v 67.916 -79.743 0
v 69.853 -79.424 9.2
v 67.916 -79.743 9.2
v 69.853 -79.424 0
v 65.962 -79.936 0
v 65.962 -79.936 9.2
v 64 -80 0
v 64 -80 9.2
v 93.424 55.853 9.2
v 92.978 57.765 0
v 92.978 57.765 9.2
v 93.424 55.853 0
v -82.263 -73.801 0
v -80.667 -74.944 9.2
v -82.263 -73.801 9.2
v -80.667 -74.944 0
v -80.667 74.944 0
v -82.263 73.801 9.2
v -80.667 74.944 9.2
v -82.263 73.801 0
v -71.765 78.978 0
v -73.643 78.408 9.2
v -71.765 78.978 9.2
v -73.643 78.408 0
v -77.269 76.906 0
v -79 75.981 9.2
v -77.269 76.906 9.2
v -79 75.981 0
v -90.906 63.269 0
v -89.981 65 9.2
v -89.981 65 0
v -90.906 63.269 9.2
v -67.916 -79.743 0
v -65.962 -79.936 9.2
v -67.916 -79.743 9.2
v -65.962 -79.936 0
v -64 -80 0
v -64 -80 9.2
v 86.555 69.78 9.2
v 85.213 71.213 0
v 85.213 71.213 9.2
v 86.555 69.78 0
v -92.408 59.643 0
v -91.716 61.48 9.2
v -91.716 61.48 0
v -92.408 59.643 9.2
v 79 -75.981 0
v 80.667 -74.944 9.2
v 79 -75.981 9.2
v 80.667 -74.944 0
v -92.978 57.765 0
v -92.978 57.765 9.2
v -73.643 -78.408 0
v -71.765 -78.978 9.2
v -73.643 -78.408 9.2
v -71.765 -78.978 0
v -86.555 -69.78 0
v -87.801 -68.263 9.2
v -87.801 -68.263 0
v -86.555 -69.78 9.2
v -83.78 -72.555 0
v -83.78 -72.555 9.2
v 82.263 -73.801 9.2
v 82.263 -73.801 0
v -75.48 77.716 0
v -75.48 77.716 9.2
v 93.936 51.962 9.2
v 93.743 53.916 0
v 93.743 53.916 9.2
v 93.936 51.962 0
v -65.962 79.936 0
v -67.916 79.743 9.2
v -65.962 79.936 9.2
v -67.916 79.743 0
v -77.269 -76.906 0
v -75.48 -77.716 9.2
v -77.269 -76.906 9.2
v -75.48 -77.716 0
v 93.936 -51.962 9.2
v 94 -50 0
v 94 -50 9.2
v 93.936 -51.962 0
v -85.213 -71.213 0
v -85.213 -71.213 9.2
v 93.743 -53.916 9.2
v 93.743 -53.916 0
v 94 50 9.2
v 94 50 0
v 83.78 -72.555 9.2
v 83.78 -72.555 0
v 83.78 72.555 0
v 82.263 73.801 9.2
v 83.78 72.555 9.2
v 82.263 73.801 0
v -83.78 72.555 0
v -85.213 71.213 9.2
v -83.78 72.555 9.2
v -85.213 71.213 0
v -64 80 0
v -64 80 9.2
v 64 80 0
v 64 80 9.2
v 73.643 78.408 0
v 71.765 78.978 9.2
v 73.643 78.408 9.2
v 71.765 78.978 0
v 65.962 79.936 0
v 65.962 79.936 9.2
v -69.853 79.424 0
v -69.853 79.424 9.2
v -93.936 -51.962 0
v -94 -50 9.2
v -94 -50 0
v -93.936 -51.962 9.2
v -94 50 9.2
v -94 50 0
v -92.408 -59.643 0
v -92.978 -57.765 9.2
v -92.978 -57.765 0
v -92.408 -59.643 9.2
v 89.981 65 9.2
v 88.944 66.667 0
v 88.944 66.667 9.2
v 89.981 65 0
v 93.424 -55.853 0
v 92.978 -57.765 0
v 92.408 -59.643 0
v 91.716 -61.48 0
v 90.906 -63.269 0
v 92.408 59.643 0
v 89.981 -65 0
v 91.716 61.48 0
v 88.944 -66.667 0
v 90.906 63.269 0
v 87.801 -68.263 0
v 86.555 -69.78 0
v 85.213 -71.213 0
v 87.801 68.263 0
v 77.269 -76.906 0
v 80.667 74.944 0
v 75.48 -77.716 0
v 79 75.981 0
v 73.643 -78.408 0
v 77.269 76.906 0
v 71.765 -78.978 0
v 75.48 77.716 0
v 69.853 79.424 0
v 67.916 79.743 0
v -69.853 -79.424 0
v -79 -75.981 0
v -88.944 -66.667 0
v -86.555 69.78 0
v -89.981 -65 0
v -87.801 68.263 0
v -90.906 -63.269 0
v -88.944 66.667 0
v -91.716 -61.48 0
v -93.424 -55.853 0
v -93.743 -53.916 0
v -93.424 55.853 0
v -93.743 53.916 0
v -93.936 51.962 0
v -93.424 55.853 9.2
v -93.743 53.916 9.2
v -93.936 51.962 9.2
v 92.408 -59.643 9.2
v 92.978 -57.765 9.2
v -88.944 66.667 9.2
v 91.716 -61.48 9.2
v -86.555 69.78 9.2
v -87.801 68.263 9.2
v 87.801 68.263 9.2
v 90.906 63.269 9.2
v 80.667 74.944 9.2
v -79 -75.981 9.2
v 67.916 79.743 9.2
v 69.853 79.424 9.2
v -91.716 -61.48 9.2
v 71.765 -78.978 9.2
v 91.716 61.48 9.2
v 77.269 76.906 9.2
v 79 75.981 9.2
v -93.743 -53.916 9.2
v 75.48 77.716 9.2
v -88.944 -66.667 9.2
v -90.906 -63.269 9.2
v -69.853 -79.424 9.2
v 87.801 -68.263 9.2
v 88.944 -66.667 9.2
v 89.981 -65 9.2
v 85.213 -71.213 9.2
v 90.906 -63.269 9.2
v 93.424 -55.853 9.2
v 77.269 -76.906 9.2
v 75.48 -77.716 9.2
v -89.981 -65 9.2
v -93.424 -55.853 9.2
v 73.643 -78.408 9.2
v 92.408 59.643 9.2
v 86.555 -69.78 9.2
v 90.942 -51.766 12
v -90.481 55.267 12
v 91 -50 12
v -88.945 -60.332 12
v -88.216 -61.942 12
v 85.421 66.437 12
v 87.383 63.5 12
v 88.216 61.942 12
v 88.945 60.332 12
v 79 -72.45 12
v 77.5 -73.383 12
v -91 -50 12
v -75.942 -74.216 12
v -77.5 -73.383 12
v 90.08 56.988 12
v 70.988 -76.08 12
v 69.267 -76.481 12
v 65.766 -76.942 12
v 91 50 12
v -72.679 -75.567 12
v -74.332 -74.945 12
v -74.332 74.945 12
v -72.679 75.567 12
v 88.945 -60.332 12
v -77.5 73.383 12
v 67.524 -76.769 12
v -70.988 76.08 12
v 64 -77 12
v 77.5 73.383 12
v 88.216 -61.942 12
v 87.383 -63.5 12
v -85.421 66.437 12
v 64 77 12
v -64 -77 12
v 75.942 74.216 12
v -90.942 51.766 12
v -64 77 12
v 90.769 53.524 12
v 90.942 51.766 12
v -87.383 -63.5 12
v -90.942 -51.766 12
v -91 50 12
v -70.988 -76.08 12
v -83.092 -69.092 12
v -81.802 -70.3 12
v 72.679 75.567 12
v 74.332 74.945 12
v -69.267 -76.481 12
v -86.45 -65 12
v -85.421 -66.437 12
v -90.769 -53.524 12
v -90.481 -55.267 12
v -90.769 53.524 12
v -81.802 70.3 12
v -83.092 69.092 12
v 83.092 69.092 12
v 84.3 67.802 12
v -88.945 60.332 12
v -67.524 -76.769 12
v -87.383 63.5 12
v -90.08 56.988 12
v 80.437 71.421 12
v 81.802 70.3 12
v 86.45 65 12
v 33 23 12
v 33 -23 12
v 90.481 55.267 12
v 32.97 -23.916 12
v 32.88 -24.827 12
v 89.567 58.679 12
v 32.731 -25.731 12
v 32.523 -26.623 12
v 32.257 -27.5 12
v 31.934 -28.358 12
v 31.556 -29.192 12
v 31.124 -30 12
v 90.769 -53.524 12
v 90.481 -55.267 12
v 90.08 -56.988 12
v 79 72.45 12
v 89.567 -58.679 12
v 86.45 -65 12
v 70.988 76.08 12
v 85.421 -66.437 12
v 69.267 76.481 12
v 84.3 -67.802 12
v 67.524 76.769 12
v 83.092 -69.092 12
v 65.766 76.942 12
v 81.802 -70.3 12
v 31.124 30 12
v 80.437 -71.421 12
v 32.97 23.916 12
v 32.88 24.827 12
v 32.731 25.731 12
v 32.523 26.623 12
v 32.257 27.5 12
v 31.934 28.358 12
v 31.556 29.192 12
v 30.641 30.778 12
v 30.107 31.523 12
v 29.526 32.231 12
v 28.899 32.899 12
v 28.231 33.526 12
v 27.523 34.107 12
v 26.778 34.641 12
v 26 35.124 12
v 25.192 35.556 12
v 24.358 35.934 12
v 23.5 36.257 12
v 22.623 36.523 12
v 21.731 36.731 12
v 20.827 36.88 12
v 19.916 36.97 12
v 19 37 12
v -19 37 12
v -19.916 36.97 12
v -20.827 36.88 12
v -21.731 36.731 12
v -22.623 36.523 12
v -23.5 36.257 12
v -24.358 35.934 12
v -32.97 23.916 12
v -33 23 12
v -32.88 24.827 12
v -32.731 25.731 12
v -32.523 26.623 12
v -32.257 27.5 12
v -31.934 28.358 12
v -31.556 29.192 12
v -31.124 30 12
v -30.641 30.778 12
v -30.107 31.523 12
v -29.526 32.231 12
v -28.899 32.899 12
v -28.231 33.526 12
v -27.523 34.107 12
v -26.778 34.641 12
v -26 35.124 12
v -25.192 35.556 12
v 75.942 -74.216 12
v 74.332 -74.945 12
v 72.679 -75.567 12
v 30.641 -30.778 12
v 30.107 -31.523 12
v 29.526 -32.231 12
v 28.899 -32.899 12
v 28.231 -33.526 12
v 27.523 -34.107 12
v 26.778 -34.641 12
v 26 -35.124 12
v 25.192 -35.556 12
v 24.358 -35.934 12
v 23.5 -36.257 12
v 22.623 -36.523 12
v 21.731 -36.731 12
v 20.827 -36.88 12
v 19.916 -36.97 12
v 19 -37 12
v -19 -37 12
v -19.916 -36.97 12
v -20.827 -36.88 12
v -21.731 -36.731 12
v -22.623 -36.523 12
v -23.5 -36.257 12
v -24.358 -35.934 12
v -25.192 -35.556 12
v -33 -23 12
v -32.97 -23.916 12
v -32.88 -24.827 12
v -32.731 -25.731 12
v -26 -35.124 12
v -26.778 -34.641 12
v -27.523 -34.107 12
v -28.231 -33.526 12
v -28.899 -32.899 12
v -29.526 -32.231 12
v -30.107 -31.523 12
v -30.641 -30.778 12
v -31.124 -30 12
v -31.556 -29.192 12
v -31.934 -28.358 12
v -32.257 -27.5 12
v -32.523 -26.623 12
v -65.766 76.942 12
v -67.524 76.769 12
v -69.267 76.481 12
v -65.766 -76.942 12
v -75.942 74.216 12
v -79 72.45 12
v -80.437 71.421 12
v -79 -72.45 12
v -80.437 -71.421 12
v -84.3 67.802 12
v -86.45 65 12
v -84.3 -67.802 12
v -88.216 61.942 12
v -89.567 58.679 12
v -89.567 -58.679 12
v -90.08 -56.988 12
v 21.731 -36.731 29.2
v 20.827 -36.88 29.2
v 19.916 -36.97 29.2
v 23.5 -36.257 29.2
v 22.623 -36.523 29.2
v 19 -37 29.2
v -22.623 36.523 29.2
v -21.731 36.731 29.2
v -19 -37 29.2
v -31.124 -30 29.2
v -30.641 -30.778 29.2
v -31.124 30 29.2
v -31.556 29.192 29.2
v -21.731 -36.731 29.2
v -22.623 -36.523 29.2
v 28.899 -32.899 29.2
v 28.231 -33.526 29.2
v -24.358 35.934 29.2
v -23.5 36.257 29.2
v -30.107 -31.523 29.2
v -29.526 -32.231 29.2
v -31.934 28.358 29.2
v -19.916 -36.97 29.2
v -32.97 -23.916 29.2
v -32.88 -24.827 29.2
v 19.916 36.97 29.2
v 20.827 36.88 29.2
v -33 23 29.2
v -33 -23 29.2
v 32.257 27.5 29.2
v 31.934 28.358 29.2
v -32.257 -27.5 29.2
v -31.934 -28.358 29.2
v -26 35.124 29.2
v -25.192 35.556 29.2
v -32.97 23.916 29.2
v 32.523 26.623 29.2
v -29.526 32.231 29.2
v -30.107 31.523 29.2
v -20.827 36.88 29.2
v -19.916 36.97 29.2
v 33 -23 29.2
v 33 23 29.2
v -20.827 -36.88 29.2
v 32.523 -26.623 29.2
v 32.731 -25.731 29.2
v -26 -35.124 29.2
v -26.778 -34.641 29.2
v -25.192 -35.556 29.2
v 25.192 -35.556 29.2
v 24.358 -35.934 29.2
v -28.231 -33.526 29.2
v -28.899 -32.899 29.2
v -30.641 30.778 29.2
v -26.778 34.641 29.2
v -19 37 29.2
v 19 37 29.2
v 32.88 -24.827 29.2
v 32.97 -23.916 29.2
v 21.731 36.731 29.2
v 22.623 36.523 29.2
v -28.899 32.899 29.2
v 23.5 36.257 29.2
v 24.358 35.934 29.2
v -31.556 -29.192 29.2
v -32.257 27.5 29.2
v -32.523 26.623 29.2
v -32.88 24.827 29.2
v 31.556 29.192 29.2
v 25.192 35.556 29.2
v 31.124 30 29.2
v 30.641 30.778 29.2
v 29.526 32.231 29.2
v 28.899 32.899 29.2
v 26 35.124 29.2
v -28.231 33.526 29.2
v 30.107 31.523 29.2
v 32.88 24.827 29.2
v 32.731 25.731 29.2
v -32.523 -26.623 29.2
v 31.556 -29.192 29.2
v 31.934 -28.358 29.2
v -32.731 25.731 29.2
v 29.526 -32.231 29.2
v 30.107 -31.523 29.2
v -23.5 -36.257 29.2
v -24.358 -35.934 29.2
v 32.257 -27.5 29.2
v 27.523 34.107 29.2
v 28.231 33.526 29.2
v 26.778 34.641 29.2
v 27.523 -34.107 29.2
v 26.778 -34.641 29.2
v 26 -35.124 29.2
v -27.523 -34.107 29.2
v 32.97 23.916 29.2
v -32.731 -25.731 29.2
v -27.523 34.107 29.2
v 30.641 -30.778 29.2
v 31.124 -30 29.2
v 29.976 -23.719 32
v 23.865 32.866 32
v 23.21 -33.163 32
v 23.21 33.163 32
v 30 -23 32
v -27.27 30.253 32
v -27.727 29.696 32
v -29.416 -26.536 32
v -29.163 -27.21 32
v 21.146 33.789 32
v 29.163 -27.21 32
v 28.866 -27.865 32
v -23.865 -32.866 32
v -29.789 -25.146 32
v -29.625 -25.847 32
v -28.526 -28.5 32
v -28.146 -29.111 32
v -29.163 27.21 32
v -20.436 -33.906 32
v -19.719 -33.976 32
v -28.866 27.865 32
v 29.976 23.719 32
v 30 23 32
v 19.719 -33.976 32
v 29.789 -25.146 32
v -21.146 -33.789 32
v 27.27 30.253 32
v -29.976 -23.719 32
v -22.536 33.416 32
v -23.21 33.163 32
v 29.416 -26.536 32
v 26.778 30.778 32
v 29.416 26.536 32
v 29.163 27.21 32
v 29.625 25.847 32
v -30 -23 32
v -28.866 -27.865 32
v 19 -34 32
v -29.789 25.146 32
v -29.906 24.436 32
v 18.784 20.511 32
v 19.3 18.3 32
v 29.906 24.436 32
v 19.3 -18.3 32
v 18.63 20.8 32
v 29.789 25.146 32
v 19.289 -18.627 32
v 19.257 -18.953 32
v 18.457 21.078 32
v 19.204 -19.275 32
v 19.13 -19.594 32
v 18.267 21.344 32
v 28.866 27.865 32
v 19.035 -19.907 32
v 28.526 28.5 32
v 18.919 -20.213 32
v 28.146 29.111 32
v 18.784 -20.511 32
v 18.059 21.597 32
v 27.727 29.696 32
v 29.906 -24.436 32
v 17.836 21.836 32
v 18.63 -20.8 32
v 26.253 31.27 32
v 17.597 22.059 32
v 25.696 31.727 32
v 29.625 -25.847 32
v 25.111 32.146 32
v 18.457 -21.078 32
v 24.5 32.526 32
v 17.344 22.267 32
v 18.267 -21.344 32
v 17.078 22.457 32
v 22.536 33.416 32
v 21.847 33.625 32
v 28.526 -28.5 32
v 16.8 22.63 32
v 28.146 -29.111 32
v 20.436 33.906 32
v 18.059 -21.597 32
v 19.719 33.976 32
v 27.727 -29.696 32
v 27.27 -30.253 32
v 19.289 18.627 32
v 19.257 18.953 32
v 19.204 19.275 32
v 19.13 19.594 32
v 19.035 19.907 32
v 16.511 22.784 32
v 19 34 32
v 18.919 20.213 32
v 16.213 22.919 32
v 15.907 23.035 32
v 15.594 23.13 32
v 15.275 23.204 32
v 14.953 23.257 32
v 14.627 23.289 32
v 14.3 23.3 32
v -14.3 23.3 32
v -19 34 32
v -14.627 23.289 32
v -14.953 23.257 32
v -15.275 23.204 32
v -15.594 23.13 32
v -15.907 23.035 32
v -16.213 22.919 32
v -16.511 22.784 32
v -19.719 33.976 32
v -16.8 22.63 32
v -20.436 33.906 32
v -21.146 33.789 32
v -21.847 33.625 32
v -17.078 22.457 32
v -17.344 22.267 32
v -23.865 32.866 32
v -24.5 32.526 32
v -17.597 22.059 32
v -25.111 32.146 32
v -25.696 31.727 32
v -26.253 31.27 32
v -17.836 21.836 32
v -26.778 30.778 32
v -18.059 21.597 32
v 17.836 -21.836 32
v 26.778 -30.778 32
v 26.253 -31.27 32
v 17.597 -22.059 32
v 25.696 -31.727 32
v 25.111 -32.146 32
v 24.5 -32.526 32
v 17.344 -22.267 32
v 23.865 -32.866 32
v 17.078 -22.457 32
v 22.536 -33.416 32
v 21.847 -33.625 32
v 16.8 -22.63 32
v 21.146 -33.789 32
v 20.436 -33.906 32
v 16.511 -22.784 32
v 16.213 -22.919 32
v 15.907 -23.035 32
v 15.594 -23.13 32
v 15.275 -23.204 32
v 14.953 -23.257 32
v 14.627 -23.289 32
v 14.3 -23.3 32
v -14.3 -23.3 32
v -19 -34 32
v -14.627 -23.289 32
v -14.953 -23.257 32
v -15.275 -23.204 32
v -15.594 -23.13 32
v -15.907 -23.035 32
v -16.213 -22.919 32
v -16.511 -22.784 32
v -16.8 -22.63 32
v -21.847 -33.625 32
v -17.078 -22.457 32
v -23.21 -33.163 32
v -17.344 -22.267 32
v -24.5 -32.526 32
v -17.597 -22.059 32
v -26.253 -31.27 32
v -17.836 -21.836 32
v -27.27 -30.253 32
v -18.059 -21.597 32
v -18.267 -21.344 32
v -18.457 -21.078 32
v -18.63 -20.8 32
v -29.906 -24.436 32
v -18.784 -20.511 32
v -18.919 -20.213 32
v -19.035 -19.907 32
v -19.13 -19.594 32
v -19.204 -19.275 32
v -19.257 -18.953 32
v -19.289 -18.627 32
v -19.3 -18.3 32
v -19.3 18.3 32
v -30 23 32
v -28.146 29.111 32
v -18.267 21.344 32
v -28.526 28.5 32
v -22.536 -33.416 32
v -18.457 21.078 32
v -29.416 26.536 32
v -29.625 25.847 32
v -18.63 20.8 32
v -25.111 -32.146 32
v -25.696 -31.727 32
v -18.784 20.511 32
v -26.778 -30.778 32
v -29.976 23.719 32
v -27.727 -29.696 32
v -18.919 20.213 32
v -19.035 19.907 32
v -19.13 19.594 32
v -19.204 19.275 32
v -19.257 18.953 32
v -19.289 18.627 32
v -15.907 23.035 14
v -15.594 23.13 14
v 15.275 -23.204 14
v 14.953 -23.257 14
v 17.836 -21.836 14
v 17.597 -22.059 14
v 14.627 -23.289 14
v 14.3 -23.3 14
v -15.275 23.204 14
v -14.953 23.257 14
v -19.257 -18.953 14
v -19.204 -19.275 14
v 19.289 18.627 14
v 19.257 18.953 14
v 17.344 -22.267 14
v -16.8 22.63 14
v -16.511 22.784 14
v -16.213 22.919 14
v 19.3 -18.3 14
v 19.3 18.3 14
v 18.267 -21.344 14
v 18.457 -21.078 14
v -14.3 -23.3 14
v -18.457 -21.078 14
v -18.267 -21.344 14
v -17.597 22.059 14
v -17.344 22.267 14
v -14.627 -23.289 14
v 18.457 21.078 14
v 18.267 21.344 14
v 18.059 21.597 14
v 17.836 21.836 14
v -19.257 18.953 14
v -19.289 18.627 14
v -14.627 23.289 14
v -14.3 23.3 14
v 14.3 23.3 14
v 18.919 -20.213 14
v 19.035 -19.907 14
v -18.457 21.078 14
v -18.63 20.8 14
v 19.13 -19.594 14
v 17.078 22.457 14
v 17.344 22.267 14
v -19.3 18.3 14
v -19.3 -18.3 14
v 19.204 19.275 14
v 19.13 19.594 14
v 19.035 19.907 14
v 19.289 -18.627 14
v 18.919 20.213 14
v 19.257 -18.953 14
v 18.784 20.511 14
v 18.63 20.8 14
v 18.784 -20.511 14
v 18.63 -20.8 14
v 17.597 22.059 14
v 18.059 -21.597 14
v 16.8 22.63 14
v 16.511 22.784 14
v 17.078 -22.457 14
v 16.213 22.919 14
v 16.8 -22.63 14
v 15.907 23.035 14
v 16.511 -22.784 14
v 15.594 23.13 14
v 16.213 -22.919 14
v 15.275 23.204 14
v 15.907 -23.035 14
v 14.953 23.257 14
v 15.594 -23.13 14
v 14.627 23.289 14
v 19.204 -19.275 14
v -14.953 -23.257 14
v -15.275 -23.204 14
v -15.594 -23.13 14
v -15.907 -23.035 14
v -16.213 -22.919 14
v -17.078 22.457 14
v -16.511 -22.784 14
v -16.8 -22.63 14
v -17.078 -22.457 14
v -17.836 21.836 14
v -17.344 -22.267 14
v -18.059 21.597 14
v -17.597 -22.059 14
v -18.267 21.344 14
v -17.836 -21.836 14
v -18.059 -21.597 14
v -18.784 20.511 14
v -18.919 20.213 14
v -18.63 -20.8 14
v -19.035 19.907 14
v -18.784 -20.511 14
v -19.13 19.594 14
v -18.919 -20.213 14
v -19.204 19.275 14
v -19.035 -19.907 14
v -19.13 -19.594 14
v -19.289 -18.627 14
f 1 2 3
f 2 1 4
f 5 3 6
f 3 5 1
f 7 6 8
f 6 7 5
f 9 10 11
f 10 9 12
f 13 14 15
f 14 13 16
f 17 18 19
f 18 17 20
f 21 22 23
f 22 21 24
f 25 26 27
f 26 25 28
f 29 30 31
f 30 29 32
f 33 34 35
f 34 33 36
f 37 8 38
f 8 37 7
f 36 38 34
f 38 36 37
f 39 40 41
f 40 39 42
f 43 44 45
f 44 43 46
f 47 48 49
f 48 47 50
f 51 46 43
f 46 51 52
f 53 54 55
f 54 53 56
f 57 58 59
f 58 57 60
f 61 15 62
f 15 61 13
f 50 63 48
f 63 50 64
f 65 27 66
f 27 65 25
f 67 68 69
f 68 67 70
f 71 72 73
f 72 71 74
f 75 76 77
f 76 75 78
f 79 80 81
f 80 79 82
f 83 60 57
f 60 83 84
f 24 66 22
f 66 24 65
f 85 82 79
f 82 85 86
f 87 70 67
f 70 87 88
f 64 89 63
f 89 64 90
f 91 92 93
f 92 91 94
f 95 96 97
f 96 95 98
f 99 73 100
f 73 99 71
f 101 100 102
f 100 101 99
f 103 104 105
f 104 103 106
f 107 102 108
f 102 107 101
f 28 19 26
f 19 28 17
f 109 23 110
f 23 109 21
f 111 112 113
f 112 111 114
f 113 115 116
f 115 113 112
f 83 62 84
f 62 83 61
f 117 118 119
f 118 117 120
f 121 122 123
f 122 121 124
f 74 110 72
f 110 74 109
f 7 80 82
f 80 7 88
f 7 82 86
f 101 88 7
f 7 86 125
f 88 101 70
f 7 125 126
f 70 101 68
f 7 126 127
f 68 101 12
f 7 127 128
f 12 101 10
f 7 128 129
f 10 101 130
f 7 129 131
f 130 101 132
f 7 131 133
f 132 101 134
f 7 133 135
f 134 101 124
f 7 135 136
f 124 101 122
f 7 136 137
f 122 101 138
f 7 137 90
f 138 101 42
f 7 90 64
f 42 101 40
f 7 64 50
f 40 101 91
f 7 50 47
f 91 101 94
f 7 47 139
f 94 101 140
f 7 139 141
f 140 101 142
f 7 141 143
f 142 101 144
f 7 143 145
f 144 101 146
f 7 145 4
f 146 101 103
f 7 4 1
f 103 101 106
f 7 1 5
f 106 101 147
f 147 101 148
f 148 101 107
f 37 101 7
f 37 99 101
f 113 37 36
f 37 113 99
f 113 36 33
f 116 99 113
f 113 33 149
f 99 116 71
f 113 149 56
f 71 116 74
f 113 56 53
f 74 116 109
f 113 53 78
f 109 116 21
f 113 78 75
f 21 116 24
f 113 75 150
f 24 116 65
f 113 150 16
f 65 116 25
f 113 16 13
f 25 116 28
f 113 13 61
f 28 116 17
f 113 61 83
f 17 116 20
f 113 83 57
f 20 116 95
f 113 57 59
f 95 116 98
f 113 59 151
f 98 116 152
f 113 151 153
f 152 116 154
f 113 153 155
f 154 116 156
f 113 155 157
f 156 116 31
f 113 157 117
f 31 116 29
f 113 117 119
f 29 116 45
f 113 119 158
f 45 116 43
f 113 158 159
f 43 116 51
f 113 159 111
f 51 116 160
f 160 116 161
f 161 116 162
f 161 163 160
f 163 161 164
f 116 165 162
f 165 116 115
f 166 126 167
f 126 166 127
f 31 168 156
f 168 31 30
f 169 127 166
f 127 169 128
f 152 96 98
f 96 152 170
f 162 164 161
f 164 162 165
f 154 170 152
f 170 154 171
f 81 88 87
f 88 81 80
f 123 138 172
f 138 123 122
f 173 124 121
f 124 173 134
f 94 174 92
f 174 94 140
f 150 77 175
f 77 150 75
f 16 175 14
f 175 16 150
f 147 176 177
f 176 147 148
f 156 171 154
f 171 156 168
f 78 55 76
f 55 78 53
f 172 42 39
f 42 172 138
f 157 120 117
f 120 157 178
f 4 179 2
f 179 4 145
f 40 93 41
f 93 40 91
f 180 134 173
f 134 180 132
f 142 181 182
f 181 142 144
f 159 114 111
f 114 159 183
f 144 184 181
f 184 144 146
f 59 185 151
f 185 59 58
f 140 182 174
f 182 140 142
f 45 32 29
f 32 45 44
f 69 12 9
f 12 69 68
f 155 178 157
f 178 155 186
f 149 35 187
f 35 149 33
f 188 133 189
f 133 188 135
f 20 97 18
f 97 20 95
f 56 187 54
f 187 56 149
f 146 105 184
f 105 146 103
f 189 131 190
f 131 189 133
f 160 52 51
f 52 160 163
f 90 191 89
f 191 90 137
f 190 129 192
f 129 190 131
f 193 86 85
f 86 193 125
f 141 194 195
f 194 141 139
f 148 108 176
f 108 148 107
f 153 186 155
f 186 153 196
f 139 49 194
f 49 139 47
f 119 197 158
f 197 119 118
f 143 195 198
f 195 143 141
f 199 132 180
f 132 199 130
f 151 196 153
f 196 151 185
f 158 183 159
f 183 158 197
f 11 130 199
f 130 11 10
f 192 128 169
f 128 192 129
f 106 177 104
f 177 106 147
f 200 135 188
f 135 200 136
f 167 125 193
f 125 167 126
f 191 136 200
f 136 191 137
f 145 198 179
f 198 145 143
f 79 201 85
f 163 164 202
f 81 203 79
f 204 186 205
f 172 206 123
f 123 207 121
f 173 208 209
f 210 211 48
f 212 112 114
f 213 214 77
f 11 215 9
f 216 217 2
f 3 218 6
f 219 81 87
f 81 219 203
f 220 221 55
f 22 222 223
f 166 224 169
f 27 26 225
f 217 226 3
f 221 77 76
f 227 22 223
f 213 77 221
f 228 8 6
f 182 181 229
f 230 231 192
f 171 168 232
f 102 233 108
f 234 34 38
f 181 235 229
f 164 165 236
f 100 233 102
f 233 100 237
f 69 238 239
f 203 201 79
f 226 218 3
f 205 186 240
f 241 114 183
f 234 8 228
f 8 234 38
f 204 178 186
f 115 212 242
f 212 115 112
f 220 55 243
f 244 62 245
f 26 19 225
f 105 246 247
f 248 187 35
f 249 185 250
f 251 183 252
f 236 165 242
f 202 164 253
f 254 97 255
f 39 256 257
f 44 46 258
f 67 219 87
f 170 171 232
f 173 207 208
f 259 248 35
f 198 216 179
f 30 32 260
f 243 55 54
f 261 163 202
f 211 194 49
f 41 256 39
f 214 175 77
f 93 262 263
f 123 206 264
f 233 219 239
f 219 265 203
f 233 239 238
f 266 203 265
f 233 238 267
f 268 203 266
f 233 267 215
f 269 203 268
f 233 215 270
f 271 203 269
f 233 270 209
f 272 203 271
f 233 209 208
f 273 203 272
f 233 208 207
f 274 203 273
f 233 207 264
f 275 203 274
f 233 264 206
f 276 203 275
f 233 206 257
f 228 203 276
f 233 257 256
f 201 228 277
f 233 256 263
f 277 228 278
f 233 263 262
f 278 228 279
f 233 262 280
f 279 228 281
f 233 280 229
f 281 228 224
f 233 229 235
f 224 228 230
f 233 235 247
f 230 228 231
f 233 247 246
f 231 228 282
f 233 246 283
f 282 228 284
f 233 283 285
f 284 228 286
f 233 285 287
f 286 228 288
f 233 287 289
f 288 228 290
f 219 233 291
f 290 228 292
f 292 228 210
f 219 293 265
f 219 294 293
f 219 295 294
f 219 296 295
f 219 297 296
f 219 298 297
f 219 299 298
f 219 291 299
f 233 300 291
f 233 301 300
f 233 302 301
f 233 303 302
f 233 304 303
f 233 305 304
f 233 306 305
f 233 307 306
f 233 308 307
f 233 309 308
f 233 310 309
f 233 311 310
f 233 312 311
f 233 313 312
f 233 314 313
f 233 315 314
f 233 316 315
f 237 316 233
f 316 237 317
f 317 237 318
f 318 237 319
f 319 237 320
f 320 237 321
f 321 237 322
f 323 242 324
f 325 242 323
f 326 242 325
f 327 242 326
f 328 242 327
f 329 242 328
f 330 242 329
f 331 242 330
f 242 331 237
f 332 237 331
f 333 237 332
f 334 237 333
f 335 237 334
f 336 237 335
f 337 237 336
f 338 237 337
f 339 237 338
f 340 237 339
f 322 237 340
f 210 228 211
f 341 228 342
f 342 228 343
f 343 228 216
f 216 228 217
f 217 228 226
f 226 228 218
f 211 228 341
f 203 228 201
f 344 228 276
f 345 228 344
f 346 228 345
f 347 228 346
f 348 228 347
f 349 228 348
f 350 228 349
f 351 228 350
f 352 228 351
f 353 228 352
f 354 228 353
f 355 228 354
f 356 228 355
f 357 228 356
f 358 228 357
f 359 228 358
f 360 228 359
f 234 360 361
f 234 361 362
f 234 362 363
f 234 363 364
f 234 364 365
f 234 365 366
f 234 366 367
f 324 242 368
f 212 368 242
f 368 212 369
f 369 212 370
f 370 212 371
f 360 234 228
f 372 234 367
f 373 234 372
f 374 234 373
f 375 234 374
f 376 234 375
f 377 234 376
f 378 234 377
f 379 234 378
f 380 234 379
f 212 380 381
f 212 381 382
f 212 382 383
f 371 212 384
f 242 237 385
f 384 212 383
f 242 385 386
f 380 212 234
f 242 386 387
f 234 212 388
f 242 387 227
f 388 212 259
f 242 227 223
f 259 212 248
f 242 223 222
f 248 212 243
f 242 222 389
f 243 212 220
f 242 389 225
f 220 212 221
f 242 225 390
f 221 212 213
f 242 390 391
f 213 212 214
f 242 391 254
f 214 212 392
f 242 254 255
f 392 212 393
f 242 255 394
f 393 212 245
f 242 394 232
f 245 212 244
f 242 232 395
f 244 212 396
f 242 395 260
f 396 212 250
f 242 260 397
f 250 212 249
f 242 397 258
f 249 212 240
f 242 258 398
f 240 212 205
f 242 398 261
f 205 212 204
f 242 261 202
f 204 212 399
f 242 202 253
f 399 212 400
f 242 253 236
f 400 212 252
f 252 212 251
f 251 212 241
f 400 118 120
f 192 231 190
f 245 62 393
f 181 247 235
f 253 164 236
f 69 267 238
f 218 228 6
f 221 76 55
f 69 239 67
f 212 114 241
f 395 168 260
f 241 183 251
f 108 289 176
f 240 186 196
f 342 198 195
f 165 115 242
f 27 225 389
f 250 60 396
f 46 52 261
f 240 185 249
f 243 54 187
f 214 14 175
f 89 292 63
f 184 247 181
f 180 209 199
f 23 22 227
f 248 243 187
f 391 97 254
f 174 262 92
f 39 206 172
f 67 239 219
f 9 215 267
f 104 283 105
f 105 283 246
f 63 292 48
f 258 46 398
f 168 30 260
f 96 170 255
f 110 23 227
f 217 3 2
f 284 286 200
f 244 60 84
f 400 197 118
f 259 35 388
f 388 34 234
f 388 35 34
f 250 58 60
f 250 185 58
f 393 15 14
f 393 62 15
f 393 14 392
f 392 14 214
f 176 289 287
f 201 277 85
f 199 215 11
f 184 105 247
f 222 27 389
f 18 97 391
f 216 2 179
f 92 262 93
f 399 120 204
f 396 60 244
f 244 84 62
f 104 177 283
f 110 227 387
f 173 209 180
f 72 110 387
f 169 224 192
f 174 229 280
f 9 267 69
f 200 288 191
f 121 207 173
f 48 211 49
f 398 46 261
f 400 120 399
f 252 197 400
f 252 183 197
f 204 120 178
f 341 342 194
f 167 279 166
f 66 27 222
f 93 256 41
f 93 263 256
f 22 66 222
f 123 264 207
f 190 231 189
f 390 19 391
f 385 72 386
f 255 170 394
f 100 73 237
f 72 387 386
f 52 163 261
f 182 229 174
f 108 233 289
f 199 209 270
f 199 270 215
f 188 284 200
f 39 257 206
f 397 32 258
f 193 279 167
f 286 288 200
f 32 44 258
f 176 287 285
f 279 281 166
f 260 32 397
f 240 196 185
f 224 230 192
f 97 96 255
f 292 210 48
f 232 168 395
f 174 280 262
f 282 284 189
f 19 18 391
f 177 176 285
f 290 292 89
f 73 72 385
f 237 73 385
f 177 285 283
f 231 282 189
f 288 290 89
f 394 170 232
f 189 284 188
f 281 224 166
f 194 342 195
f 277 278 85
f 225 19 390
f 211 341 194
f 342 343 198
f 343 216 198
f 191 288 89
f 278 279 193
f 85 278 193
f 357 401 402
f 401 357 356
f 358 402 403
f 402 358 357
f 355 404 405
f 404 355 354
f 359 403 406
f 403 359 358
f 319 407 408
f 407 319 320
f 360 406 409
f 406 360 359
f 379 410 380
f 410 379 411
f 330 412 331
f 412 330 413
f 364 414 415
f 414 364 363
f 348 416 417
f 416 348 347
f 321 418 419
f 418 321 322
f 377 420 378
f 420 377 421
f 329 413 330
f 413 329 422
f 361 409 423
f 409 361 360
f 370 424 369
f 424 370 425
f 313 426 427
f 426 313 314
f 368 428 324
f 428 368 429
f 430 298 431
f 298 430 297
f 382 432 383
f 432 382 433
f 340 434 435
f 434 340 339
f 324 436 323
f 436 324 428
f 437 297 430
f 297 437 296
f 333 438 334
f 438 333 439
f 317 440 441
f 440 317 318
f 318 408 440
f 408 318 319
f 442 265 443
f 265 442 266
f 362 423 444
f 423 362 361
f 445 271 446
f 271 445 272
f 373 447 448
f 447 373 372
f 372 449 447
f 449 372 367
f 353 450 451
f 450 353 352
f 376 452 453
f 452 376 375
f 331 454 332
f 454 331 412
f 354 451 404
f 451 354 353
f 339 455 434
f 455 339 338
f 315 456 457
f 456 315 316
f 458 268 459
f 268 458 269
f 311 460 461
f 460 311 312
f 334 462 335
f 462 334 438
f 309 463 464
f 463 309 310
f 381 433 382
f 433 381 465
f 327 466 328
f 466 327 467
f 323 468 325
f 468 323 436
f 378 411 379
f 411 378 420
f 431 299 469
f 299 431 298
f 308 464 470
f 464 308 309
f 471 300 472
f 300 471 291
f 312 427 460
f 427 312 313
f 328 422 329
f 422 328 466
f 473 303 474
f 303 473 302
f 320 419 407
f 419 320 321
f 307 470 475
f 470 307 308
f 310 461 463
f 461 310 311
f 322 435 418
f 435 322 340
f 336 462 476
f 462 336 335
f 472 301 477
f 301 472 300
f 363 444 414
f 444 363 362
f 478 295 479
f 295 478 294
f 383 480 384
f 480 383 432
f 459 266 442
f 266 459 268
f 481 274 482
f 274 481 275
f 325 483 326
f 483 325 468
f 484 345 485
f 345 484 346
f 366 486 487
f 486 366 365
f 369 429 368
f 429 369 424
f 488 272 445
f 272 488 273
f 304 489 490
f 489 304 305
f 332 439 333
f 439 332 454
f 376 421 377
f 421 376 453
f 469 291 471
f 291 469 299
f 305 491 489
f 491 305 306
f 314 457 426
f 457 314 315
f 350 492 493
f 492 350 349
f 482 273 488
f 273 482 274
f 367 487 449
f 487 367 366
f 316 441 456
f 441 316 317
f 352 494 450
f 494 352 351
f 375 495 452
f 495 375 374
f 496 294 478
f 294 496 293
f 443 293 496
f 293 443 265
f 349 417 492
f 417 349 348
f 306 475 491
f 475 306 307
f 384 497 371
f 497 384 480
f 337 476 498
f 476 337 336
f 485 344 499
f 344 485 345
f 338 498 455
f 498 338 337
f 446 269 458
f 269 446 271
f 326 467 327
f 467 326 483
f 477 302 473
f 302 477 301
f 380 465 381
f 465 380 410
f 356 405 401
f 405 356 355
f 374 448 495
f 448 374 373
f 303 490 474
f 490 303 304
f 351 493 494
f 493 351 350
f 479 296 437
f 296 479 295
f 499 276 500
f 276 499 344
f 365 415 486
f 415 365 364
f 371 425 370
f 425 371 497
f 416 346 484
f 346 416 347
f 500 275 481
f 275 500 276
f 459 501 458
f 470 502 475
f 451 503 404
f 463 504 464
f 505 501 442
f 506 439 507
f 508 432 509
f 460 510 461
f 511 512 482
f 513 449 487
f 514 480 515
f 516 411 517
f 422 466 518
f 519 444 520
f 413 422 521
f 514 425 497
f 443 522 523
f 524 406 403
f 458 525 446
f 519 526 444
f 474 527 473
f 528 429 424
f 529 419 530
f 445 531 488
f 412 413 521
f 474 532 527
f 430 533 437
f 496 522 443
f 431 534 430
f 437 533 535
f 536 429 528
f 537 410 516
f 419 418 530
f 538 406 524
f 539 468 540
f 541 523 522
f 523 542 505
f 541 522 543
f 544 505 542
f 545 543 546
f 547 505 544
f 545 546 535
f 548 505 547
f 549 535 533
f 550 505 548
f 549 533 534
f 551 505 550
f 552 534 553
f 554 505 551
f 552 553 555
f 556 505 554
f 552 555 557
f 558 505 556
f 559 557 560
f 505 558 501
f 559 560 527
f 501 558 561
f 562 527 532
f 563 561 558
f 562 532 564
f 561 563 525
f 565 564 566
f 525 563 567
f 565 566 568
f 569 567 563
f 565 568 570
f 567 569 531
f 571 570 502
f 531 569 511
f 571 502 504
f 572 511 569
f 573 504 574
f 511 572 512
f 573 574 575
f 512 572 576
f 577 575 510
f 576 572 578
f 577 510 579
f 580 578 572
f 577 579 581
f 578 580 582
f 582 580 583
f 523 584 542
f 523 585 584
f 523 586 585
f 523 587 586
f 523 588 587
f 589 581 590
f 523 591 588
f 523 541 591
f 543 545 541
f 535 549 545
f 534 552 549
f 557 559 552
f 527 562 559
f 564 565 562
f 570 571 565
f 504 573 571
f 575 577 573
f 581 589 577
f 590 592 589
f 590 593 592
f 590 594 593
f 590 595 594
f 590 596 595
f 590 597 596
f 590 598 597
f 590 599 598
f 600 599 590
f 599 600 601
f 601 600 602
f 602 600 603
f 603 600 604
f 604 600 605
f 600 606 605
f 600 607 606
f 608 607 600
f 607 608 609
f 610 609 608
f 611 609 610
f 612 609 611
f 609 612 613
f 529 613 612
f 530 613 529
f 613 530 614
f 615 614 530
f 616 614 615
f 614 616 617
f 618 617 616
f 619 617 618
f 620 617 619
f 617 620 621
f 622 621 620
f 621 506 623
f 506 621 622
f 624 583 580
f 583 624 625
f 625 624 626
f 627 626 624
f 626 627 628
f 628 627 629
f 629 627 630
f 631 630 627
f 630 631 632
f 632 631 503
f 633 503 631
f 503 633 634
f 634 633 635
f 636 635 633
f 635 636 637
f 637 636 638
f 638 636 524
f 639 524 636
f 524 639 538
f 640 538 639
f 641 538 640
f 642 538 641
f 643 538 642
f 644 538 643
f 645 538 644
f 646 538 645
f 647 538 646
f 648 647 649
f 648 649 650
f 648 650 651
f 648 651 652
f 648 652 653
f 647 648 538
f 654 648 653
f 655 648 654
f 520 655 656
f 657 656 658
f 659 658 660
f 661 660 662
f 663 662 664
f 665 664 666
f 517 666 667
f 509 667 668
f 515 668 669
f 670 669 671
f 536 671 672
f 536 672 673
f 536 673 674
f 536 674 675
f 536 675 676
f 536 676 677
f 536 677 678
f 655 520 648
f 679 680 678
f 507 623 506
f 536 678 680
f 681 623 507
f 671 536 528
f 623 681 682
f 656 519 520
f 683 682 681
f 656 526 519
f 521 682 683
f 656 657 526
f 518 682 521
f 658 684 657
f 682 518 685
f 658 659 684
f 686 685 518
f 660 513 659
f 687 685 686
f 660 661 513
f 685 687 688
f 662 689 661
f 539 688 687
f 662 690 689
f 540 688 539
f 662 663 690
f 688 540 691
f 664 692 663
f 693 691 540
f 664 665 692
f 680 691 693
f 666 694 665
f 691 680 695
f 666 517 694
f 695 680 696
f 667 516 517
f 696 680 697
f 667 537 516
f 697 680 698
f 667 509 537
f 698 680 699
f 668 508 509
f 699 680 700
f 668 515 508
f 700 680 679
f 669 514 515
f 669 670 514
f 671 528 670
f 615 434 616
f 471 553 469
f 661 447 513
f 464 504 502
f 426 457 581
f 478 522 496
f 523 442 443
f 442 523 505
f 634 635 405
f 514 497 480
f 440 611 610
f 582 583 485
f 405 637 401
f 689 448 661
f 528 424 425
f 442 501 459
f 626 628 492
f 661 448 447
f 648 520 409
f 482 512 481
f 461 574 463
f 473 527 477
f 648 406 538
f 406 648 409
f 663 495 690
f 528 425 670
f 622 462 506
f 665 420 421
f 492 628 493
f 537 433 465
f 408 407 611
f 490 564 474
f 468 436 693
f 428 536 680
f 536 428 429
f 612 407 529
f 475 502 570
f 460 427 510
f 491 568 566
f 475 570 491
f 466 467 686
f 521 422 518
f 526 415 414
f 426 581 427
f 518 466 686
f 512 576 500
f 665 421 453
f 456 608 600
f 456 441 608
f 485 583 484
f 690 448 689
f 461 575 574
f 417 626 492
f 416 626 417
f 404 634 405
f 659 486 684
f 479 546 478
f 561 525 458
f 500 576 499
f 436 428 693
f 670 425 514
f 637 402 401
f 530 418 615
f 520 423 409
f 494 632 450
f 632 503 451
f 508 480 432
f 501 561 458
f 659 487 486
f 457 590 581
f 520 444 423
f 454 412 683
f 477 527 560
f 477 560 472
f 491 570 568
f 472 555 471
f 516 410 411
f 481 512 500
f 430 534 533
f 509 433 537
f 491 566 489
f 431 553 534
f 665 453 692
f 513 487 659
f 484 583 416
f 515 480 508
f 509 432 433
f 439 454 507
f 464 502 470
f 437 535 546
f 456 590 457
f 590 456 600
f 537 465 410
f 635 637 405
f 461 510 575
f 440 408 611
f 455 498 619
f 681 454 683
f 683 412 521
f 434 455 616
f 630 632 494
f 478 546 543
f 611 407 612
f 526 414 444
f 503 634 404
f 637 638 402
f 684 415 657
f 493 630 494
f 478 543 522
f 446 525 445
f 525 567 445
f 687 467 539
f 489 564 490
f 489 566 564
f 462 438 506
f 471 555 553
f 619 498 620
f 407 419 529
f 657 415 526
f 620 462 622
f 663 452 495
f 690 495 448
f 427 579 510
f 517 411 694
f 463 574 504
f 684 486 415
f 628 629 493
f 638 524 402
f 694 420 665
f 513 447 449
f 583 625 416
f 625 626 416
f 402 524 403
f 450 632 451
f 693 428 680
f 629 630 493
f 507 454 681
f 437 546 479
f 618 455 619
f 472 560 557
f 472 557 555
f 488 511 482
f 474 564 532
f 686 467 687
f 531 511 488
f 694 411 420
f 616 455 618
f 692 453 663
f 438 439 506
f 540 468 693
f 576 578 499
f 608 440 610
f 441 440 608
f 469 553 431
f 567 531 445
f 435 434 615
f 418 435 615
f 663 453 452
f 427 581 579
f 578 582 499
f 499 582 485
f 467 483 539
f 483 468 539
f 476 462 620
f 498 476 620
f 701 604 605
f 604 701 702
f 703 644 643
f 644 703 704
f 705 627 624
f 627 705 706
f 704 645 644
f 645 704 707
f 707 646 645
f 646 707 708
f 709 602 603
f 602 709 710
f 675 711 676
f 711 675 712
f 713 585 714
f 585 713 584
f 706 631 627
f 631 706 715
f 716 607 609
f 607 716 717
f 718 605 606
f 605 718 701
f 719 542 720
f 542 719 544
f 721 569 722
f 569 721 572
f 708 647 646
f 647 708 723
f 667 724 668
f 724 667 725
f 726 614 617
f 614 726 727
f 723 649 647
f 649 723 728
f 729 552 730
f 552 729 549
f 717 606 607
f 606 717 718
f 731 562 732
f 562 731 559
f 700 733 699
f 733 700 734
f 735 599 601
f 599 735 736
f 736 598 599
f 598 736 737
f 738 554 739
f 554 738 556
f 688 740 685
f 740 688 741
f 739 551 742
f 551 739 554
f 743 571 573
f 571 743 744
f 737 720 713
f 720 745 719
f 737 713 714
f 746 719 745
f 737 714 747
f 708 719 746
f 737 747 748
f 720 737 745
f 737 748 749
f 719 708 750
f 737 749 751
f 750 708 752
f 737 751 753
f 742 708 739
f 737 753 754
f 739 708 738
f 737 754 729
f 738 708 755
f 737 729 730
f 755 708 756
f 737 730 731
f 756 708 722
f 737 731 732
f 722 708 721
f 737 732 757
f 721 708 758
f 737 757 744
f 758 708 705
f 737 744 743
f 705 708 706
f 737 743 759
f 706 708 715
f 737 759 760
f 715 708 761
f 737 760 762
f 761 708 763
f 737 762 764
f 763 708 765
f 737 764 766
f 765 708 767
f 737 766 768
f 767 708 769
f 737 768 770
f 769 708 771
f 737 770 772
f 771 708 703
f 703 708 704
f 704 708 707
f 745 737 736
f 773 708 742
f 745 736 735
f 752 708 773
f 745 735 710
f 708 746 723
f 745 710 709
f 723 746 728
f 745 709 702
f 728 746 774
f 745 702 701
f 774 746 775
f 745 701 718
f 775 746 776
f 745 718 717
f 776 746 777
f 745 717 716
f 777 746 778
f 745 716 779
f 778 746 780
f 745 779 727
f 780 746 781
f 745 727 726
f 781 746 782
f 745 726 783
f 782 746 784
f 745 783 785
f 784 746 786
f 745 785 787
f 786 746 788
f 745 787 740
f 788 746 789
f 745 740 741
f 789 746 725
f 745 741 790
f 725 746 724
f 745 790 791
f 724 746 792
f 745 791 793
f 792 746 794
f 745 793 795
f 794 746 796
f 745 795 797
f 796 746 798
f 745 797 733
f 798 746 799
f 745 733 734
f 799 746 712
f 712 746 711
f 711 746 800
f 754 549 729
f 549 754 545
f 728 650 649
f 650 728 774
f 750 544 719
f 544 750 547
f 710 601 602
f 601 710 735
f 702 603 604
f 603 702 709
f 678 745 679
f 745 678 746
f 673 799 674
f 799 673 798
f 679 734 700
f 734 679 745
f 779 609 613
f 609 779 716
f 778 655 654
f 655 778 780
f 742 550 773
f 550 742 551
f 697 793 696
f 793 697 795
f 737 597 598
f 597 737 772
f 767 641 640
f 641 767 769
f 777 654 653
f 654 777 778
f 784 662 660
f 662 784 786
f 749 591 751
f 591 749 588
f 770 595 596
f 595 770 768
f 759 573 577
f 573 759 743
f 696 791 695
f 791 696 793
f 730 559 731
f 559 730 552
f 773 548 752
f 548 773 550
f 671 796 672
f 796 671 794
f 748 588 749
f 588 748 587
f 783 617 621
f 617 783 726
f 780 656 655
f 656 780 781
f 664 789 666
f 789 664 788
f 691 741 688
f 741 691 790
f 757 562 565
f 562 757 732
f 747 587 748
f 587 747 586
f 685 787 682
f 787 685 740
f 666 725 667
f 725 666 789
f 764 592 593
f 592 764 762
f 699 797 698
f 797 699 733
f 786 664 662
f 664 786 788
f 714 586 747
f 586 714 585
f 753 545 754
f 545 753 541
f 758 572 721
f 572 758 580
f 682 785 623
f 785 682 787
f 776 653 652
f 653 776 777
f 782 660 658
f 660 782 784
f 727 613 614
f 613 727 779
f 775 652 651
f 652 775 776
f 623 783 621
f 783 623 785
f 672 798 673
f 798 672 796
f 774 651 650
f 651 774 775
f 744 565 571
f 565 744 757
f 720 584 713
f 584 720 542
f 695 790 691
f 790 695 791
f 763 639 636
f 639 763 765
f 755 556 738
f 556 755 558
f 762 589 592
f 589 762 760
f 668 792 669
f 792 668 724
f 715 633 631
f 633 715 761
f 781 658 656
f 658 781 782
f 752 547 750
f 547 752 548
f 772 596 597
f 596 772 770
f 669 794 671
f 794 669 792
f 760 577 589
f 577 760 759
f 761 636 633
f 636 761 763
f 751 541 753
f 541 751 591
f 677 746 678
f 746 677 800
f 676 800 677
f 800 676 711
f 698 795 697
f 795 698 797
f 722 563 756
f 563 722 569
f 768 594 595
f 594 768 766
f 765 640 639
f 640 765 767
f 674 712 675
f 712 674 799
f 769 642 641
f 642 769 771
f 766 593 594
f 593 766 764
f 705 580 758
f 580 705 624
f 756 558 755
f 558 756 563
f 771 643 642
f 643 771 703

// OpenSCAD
// Headphone stand in three printable parts: base, post, hanger.
// No glue, no screws. Rectangular (non-round) blade tenons prevent spinning.
// All dimensions in mm. Print orientation is the exported orientation (+Z up).
//
// Assembly heights (assembly coordinates, desk at z=0):
//   base plate/boss top        0 .. 32
//   post                       14.5 .. 250  (17.5 mm of it inside the base socket)
//   hanger tenon               228.5 .. 250 (21.5 mm inside the post socket)
//   hanger saddle top centre   270
// Socket clearances: 0.3 mm per side (socket is tenon + 0.6 in each dimension),
// tenon tips stop 0.5 mm above socket floors; shoulders/faces give the depth stop
// for the hanger, and the post bottoms in its socket.

part = "base"; // [base, post, hanger, assembly]
cadverify_only = "";

$fn = 96;

/* [Base] */
base_w = 188;          // desk footprint, X
base_d = 160;          // desk footprint, Y
base_plate_top = 9;    // straight plate wall up to here, then 45 deg chamfer to 12
base_top_plate = 12;
boss_w = 66;
boss_d = 74;
boss_straight_top = 29; // then 45 deg chamfer to boss_top
boss_top = 32;
base_socket_w = 38.6;  // post 38 + 0.6
base_socket_d = 46.6;  // post 46 + 0.6
base_socket_floor = 14;

/* [Post] */
post_w = 38;
post_d = 46;
post_len = 235.5;      // tip (local z=0) to top (assembly 250)
post_top_socket_w = 24.6; // hanger tenon 24 + 0.6
post_top_socket_d = 34.6; // hanger tenon 34 + 0.6
post_top_socket_floor_local = 213.5; // assembly 228

/* [Hanger, modelled in print coordinates] */
// Print coordinates: X = saddle length, Y = height above tenon tip,
// Z = saddle width direction (part lies on its Z=0 side face on the bed).
hang_len_half = 69;    // overall saddle half length incl. rounded end point
hang_width = 34;       // >= 30 mm headband support width
hang_top_rel = 41.5;   // tenon tip to saddle crown; assembly 228.5 + 41.5 = 270
hang_arc_r = 170;      // crown radius of the headband contact surface
hang_plate_t = 10;     // saddle plate thickness (vertical, in profile)
hang_tenon_half_w = 12;  // tenon is 24 (X) x 34 (width)
hang_shoulder_rel = 21.5; // assembly 250, post top
hang_neck_half_w = 17;

function hang_top_z(x) = hang_top_rel - (hang_arc_r - sqrt(hang_arc_r*hang_arc_r - x*x));
function hang_bot_z(x) = hang_top_z(x) - hang_plate_t;

module rounded_rect(w, d, r) {
    offset(r = r) square([w - 2*r, d - 2*r], center = true);
}

module instance(name, part_name, unit = 1) {
    echo(cadverify_instance = [name, part_name, unit]);
    if (cadverify_only == "" || cadverify_only == name) children();
}

/* ---------- BASE (print = assembly orientation) ---------- */
module base_part() {
    difference() {
        // Outer corners of the plate and boss are rounded in plan view (corner
        // radius >= 6 mm) and the top rims have 45 deg x 3 mm chamfers, so
        // nothing sticks out beyond the bounding box or the support plane.
        union() {
            // desk plate with 45 deg top edge chamfer
            linear_extrude(base_plate_top) rounded_rect(base_w, base_d, 30);
            hull() {
                translate([0, 0, base_plate_top]) linear_extrude(0.2)
                    rounded_rect(base_w, base_d, 30);
                translate([0, 0, base_top_plate - 0.2]) linear_extrude(0.2)
                    rounded_rect(base_w - 6, base_d - 6, 27);
            }
            // raised boss / collar around the post socket, 45 deg top chamfer
            translate([0, 0, base_top_plate])
                linear_extrude(boss_straight_top - base_top_plate)
                    rounded_rect(boss_w, boss_d, 14);
            hull() {
                translate([0, 0, boss_straight_top]) linear_extrude(0.2)
                    rounded_rect(boss_w, boss_d, 14);
                translate([0, 0, boss_top - 0.2]) linear_extrude(0.2)
                    rounded_rect(boss_w - 6, boss_d - 6, 11);
            }
        }
        // blind rectangular socket for the post (stops post spinning)
        translate([0, 0, base_socket_floor])
            linear_extrude(boss_top - base_socket_floor + 2)
                rounded_rect(base_socket_w, base_socket_d, 5);
    }
}

/* ---------- POST (printed upright, local z=0 is tenon tip) ---------- */
module post_part() {
    difference() {
        // Solid rectangular column, corners rounded 8 mm in plan view.
        linear_extrude(post_len) rounded_rect(post_w, post_d, 8);
        // Blind rectangular socket in the top for the hanger blade tenon:
        // tenon + 0.6 mm per side (0.3 mm clearance); the non-round rectangle
        // is what stops the hanger spinning on the post.
        translate([0, 0, post_top_socket_floor_local])
            linear_extrude(post_len - post_top_socket_floor_local + 2)
                rounded_rect(post_top_socket_w, post_top_socket_d, 5);
    }
}

/* ---------- HANGER (printed on its side) ---------- */
module hanger_part() {
    top_pts    = [for (x = [56 : -8 : -56]) [x, hang_top_z(x)]];
    bot_r_pts  = [for (x = [40 : 8 : 64]) [x + 8, hang_bot_z(x)]];
    bot_l_pts  = [for (x = [-64 : 8 : -40]) [x - 8, hang_bot_z(x - 8)]];
    mid64 = (hang_top_z(64) + hang_bot_z(64)) / 2;
    // Saddle/neck profile above the shoulder plane (print y = hang_shoulder_rel).
    profile = concat(
        [[-hang_neck_half_w, hang_shoulder_rel], [hang_neck_half_w, hang_shoulder_rel],
         [30, hang_bot_z(30)]],
        bot_r_pts,
        [[hang_len_half - 0.5, mid64], [64, hang_top_z(64)]],
        top_pts,
        [[-64, hang_top_z(64)], [-(hang_len_half - 0.5), mid64], [-64, hang_bot_z(64)]],
        bot_l_pts,
        [[-30, hang_bot_z(30)]]
    );
    difference() {
        union() {
            linear_extrude(hang_width) polygon(profile);
            // Blade tenon below the shoulder: 24 x 34 with 4 mm corner radii,
            // so it clears the post socket's 5 mm rounded corners. It reaches
            // 2 mm up into the neck so the union is volumetric, not face-only.
            translate([0, 0, hang_width/2]) rotate([-90, 0, 0])
                linear_extrude(hang_shoulder_rel + 2)
                    rounded_rect(2*hang_tenon_half_w, hang_width, 4);
        }
        // 45 deg chamfers on the two crown side edges, limited to the central
        // contact zone |x| <= 36. Each box is the half-space beyond its
        // chamfer plane, rotated -45 deg about X from an origin on the plane:
        //   far side keeps Y + Z <= hang_top_z(36) + hang_width
        //   bed side keeps Y - Z <= hang_top_z(36)
        // At |x| = 36 the crown meets the plane, so beyond it the plate keeps
        // its full 34 mm width; at the centre the chamfers leave a ~30.7 mm
        // flat crown. The bed-side chamfer face itself is exactly 45 deg.
        translate([0, hang_top_z(36), hang_width]) rotate([-45, 0, 0])
            translate([-36, 0, 0]) cube([72, 40, 40]);
        translate([0, hang_top_z(36), 0]) rotate([-45, 0, 0])
            translate([-36, 0, 0]) cube([72, 40, 40]);
    }
}

/* ---------- Spec echoes ---------- */
if (part == "base") {
    echo(cadverify_spec = [
        ["bounds", [[-base_w/2, -base_d/2, 0], [base_w/2, base_d/2, boss_top]]],
        ["bodies", 1],
        ["through_holes", 0],
        ["support_faces", [["desk", "-z", 25000]]],
        ["overhangs_allowed", []],
        ["copies", 1],
        ["details", [
            ["plate", "material", [[-80, -60, 2], [80, 60, 10]], 0.99],
            ["boss_wall", "material", [[22, -30, 16], [31, 30, 28]], 0.99],
            ["post_socket", "void", [[-17, -21, 16], [17, 21, 30]], 0.99],
            ["socket_floor", "thickness", [0, 0, 42], [0, 0, -1], base_socket_floor],
            ["boss_socket_top", "view", [[-34, -38, 27], [34, 38, boss_top]]]
        ]]
    ]);
} else if (part == "post") {
    echo(cadverify_spec = [
        ["bounds", [[-post_w/2, -post_d/2, 0], [post_w/2, post_d/2, post_len]]],
        ["bodies", 1],
        ["through_holes", 0],
        ["support_faces", [["bed", "-z", 1500]]],
        ["overhangs_allowed", []],
        ["copies", 1],
        ["details", [
            ["column", "material", [[-16, -20, 30], [16, 20, 200]], 0.99],
            ["hanger_socket", "void", [[-10, -15, 216], [10, 15, 234]], 0.99],
            ["column_width", "thickness", [32, 0, 100], [-1, 0, 0], post_w],
            ["top_socket", "view", [[-19, -23, 210], [19, 23, post_len]]]
        ]]
    ]);
} else if (part == "hanger") {
    // actual extreme points are the saddle end tips at +-(hang_len_half - 0.5)
    echo(cadverify_spec = [
        ["bounds", [[-(hang_len_half - 0.5), 0, 0], [hang_len_half - 0.5, hang_top_rel, hang_width]]],
        ["bodies", 1],
        ["through_holes", 0],
        ["support_faces", [["bed", "-z", 1200]]],
        ["overhangs_allowed", [
            ["45deg crown chamfer on bed side", [[-36, 37, 0], [36, hang_top_rel, 5]]]
        ]],
        ["copies", 1],
        ["details", [
            ["saddle_plate", "material", [[-25, 32, 5], [25, 38, 29]], 0.99],
            ["tenon", "material", [[-10, 2, 5], [10, 20, 29]], 0.99],
            ["saddle_thickness", "thickness", [50, 52, 17], [0, -1, 0], hang_plate_t],
            ["rounded_crown", "view", [[-40, 27, 0], [40, hang_top_rel, hang_width]]]
        ]]
    ]);
} else if (part == "assembly") {
    echo(cadverify_spec = [
        ["bounds", [[-base_w/2, -base_d/2, 0], [base_w/2, base_d/2, 270]]],
        ["support_faces", [["desk", "-z", 25000]]],
        ["allowed_interferences", []],
        ["assembly_order", [
            [["base"], [0, 0, 0]],
            [["post"], [0, 0, -1]],
            [["hanger"], [0, 0, -1]]
        ]]
    ]);
}

/* ---------- Output ---------- */
if (part == "base") {
    base_part();
} else if (part == "post") {
    post_part();
} else if (part == "hanger") {
    hanger_part();
} else if (part == "assembly") {
    instance("base", "base") base_part();
    instance("post", "post") translate([0, 0, 14.5]) post_part();
    // hanger print coords (x, y=height rel. tenon tip, z=width)
    //   -> assembly (x, 17-z, 228.5+y): tenon tip at 228.5, crown at 270
    instance("hanger", "hanger")
        translate([0, hang_width/2, 228.5]) rotate([90, 0, 0]) hanger_part();
} else {
    assert(false, str("unknown part: ", part));
}
